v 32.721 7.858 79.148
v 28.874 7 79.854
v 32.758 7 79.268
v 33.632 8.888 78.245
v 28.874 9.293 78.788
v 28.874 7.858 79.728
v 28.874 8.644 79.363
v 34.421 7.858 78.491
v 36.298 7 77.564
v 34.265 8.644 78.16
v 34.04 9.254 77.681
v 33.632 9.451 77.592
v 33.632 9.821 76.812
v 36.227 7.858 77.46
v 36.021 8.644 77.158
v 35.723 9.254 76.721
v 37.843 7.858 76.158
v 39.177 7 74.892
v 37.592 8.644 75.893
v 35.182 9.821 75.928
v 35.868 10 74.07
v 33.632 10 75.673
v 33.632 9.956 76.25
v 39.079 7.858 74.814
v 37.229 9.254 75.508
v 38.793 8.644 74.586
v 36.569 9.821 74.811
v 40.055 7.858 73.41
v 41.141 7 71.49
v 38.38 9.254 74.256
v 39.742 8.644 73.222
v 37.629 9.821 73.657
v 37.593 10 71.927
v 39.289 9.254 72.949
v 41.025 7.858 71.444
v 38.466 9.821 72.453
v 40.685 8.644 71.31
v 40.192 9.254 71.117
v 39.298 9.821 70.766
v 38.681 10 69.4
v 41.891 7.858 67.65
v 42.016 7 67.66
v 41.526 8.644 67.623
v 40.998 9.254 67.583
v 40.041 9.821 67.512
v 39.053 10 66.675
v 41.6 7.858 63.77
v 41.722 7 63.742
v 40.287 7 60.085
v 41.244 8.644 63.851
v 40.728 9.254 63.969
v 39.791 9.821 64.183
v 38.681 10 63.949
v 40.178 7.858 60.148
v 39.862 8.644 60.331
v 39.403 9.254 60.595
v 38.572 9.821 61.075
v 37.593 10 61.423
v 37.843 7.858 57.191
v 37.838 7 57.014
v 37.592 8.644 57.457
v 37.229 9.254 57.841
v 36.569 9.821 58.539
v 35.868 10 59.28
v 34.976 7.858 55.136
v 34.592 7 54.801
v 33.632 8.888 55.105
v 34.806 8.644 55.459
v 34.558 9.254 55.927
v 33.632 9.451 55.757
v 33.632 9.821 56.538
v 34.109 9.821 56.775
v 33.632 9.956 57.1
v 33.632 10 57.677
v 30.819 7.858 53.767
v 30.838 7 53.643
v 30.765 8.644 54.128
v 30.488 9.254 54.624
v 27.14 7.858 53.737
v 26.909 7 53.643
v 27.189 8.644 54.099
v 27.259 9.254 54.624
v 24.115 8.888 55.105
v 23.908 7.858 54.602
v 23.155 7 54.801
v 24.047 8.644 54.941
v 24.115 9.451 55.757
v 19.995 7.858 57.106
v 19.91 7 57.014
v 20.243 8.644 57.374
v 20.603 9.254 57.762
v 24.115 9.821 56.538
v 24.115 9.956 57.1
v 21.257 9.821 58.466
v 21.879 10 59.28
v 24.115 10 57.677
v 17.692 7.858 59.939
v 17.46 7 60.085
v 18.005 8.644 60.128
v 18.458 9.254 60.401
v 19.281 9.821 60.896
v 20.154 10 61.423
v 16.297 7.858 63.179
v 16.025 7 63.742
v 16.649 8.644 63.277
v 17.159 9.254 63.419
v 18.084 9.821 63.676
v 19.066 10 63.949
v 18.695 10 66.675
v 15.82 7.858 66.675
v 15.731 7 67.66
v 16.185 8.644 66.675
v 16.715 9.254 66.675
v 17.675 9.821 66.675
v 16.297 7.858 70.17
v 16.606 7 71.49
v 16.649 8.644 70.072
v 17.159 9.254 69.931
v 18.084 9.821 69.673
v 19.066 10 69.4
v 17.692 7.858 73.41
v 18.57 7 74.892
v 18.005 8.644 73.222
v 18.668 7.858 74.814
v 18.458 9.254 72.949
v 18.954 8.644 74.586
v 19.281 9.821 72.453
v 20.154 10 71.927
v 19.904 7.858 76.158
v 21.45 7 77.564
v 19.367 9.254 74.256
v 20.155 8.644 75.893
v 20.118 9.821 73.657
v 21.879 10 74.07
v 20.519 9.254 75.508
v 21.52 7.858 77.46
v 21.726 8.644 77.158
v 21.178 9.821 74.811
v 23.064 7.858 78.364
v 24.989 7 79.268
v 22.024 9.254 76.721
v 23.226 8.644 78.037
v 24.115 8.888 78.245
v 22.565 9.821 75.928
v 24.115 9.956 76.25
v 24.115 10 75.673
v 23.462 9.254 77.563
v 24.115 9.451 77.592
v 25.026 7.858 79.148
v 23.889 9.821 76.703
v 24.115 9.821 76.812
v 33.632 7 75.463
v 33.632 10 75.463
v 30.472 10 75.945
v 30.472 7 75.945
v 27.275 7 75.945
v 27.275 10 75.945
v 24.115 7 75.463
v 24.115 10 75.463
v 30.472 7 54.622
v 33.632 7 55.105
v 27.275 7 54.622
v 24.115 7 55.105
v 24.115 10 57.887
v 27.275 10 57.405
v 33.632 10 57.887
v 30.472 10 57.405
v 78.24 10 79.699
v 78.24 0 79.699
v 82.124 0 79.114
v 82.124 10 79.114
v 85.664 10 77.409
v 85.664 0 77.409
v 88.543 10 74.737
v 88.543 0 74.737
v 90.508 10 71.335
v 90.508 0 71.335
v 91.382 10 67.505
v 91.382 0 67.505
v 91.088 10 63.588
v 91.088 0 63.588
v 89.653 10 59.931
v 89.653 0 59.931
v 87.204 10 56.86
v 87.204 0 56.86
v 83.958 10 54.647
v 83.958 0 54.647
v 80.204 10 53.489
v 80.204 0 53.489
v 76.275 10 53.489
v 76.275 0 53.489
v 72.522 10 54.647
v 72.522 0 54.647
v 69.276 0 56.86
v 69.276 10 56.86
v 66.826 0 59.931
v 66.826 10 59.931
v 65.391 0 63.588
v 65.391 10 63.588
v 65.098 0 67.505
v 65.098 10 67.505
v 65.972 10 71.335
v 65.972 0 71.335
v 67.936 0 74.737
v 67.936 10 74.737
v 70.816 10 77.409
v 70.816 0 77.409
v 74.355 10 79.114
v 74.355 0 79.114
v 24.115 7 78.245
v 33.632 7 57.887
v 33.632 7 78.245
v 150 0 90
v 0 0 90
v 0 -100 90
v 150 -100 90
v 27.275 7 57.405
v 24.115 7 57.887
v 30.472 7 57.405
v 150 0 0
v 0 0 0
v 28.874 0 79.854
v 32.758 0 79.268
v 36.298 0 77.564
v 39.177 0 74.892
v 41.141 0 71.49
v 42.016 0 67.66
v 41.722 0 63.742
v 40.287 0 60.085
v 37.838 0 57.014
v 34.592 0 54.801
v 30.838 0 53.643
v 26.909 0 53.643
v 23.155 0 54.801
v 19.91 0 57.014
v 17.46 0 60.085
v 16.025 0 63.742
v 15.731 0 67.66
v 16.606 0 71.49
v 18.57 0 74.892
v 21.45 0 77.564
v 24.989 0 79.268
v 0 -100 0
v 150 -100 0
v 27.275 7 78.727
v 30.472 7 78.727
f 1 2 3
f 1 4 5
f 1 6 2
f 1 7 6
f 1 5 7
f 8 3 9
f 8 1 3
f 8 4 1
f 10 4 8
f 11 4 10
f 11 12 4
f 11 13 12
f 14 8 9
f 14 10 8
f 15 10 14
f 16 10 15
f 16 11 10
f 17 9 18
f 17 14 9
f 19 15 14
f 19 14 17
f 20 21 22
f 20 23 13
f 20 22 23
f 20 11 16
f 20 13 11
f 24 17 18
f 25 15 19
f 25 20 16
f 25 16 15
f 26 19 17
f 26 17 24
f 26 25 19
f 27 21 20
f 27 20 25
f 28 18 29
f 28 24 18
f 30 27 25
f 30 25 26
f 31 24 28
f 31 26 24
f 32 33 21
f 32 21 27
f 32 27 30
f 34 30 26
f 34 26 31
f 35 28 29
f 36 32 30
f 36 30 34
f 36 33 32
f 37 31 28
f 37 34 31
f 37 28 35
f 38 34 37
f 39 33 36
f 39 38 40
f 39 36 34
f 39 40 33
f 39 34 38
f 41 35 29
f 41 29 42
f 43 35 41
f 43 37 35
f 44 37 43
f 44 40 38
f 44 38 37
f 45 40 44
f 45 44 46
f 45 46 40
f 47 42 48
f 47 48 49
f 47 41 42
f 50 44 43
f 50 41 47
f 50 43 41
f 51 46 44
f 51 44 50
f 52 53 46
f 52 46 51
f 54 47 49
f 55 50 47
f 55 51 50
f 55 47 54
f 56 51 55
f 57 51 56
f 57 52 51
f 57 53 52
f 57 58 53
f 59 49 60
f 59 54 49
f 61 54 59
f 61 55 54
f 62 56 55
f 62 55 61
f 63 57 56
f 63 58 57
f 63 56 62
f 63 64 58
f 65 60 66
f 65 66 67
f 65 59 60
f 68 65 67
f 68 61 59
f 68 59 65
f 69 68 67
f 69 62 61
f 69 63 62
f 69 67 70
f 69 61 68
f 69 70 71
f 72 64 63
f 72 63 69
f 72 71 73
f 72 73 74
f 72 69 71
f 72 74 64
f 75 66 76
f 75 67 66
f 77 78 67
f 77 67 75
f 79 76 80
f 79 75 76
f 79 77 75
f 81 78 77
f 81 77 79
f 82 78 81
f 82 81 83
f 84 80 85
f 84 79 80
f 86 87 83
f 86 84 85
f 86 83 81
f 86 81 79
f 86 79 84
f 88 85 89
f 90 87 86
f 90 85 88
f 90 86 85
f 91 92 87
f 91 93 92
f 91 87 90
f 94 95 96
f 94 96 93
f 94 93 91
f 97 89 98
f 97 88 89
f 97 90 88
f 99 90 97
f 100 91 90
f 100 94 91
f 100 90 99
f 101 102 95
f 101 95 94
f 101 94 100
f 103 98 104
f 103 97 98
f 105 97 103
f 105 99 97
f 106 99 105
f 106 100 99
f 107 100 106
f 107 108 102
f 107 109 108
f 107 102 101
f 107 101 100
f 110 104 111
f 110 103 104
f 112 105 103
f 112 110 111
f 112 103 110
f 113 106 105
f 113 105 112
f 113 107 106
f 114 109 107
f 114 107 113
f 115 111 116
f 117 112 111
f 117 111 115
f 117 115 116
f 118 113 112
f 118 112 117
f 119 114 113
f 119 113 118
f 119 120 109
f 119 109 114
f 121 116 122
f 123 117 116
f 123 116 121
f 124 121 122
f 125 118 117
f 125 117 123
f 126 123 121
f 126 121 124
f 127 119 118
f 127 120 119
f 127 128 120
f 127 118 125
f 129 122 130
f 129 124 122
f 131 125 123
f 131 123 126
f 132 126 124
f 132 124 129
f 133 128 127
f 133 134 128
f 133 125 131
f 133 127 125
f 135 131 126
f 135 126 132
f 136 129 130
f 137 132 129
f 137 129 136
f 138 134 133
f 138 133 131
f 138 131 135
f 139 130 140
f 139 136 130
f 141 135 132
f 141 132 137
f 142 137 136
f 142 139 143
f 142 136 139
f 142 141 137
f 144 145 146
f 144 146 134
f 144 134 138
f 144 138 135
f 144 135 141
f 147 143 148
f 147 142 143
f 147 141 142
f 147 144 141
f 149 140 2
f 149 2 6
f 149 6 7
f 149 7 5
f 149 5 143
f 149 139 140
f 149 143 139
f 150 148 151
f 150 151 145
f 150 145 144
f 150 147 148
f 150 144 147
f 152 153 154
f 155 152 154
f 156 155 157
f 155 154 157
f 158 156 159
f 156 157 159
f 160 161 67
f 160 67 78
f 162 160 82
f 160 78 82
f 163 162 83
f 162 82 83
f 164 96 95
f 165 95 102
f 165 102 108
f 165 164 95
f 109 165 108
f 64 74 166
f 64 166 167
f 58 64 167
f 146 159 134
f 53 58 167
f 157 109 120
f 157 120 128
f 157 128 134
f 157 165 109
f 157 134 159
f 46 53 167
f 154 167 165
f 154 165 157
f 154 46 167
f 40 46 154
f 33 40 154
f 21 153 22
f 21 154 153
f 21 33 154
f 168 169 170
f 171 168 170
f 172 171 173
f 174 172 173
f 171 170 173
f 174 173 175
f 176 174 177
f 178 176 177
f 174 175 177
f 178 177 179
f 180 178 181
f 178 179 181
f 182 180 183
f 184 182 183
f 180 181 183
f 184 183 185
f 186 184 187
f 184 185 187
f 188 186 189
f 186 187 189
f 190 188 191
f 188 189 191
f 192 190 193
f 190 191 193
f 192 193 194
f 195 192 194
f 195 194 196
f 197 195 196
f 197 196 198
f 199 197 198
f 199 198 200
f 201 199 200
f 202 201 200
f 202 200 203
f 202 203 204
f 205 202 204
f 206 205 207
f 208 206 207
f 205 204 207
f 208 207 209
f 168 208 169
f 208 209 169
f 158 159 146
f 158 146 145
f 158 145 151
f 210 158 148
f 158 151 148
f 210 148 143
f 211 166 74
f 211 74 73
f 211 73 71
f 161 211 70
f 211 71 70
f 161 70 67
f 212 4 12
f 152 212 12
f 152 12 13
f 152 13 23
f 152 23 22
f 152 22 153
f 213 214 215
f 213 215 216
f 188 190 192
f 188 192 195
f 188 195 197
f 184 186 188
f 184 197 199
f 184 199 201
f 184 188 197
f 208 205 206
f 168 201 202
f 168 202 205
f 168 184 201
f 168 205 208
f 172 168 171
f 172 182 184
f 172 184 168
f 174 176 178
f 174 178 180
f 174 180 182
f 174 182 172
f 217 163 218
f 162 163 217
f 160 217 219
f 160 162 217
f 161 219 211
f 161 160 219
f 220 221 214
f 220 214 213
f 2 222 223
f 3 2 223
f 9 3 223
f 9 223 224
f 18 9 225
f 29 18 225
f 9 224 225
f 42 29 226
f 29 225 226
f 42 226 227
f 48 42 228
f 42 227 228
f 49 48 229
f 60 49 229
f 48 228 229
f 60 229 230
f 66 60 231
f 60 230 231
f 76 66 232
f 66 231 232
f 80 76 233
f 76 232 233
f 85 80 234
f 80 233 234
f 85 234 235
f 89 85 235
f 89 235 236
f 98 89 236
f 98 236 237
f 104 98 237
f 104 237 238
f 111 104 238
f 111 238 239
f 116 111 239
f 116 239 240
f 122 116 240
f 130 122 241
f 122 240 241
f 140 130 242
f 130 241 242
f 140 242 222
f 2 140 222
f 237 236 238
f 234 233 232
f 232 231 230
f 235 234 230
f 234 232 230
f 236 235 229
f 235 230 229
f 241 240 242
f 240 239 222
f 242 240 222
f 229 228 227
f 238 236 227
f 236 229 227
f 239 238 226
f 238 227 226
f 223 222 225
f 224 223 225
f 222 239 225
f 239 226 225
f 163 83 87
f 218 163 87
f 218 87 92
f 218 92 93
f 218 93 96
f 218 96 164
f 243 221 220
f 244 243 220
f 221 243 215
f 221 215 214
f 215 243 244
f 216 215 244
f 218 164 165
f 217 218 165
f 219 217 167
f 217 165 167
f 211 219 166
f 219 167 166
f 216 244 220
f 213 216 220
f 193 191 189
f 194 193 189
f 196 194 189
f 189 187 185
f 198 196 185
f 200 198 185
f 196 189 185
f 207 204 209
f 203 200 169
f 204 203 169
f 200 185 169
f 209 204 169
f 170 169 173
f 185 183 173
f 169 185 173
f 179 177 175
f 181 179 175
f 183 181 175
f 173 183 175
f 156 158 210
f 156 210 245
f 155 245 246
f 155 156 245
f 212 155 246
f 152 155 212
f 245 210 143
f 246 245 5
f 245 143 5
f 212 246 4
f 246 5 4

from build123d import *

# Parameters (mm, degrees)
ESQUISSE1_W             = 150
ESQUISSE1_H             = 100
BOSS_EXTRU_1_DEPTH      = 90
ESQUISSE2_R             = 13.17894546
BOSS_EXTRU_2_DEPTH      = 10
BOSS_EXTRU_2_2_DEPTH    = 10
CONG_1_R                = 3
ENL_V_MAT_EXTRU_3_DEPTH = 3


with BuildPart() as part:
    # Esquisse1 → Boss.-Extru.1 (new body)
    with BuildSketch(Plane.XY):
        with Locations((75, -50)):
            Rectangle(ESQUISSE1_W, ESQUISSE1_H)
    extrude(amount=BOSS_EXTRU_1_DEPTH)


with BuildPart() as body_2:
    # Esquisse2 → Boss.-Extru.2 (new body)
    with BuildSketch(Plane(origin=(0, 0, 0), x_dir=(1, 0, 0), z_dir=(0, 1, 0))):
        with Locations(Location((28.873561902, -66.674797835, 0), (0, 0, 270))):
            Circle(ESQUISSE2_R)
    extrude(amount=BOSS_EXTRU_2_DEPTH)

    # Congé1
    cong_1_edges = [body_2.edges().sort_by_distance(p)[0] for p in [
        (28.873561902, 10, 53.495852375),
    ]]
    fillet(cong_1_edges, radius=CONG_1_R)

    # Esquisse3 → Enlèv. mat.-Extru.3 (cut)
    with BuildSketch(Plane(origin=(0, 10, 0), x_dir=(1, 0, 0), z_dir=(0, 1, 0))):
        with BuildLine():
            Line((24.11468515, -75.462687014), (24.11468515, -78.244799577))
            ThreePointArc((24.11468515, -78.244799577), (28.873561902, -78.787682402), (33.632438654, -78.244799577))
            Line((33.632438654, -78.244799577), (33.632438654, -75.462687014))
            ThreePointArc((33.632438654, -75.462687014), (28.873561902, -76.005569839), (24.11468515, -75.462687014))
        make_face()
        with BuildLine():
            Line((33.632438654, -57.886908657), (33.632438654, -55.104796094))
            ThreePointArc((33.632438654, -55.104796094), (28.873561902, -54.561913268), (24.11468515, -55.104796094))
            Line((24.11468515, -55.104796094), (24.11468515, -57.886908657))
            ThreePointArc((24.11468515, -57.886908657), (28.873561902, -57.344025831), (33.632438654, -57.886908657))
        make_face()
    extrude(amount=-ENL_V_MAT_EXTRU_3_DEPTH, mode=Mode.SUBTRACT)


with BuildPart() as body_3:
    # Esquisse2 → Boss.-Extru.2 2 (new body)
    with BuildSketch(Plane(origin=(0, 0, 0), x_dir=(1, 0, 0), z_dir=(0, 1, 0))):
        with Locations(Location((78.239649499, -66.520528812, 0), (0, 0, 270))):
            Circle(ESQUISSE2_R)
    extrude(amount=BOSS_EXTRU_2_2_DEPTH)


solid = Compound([part.part, body_2.part, body_3.part])
